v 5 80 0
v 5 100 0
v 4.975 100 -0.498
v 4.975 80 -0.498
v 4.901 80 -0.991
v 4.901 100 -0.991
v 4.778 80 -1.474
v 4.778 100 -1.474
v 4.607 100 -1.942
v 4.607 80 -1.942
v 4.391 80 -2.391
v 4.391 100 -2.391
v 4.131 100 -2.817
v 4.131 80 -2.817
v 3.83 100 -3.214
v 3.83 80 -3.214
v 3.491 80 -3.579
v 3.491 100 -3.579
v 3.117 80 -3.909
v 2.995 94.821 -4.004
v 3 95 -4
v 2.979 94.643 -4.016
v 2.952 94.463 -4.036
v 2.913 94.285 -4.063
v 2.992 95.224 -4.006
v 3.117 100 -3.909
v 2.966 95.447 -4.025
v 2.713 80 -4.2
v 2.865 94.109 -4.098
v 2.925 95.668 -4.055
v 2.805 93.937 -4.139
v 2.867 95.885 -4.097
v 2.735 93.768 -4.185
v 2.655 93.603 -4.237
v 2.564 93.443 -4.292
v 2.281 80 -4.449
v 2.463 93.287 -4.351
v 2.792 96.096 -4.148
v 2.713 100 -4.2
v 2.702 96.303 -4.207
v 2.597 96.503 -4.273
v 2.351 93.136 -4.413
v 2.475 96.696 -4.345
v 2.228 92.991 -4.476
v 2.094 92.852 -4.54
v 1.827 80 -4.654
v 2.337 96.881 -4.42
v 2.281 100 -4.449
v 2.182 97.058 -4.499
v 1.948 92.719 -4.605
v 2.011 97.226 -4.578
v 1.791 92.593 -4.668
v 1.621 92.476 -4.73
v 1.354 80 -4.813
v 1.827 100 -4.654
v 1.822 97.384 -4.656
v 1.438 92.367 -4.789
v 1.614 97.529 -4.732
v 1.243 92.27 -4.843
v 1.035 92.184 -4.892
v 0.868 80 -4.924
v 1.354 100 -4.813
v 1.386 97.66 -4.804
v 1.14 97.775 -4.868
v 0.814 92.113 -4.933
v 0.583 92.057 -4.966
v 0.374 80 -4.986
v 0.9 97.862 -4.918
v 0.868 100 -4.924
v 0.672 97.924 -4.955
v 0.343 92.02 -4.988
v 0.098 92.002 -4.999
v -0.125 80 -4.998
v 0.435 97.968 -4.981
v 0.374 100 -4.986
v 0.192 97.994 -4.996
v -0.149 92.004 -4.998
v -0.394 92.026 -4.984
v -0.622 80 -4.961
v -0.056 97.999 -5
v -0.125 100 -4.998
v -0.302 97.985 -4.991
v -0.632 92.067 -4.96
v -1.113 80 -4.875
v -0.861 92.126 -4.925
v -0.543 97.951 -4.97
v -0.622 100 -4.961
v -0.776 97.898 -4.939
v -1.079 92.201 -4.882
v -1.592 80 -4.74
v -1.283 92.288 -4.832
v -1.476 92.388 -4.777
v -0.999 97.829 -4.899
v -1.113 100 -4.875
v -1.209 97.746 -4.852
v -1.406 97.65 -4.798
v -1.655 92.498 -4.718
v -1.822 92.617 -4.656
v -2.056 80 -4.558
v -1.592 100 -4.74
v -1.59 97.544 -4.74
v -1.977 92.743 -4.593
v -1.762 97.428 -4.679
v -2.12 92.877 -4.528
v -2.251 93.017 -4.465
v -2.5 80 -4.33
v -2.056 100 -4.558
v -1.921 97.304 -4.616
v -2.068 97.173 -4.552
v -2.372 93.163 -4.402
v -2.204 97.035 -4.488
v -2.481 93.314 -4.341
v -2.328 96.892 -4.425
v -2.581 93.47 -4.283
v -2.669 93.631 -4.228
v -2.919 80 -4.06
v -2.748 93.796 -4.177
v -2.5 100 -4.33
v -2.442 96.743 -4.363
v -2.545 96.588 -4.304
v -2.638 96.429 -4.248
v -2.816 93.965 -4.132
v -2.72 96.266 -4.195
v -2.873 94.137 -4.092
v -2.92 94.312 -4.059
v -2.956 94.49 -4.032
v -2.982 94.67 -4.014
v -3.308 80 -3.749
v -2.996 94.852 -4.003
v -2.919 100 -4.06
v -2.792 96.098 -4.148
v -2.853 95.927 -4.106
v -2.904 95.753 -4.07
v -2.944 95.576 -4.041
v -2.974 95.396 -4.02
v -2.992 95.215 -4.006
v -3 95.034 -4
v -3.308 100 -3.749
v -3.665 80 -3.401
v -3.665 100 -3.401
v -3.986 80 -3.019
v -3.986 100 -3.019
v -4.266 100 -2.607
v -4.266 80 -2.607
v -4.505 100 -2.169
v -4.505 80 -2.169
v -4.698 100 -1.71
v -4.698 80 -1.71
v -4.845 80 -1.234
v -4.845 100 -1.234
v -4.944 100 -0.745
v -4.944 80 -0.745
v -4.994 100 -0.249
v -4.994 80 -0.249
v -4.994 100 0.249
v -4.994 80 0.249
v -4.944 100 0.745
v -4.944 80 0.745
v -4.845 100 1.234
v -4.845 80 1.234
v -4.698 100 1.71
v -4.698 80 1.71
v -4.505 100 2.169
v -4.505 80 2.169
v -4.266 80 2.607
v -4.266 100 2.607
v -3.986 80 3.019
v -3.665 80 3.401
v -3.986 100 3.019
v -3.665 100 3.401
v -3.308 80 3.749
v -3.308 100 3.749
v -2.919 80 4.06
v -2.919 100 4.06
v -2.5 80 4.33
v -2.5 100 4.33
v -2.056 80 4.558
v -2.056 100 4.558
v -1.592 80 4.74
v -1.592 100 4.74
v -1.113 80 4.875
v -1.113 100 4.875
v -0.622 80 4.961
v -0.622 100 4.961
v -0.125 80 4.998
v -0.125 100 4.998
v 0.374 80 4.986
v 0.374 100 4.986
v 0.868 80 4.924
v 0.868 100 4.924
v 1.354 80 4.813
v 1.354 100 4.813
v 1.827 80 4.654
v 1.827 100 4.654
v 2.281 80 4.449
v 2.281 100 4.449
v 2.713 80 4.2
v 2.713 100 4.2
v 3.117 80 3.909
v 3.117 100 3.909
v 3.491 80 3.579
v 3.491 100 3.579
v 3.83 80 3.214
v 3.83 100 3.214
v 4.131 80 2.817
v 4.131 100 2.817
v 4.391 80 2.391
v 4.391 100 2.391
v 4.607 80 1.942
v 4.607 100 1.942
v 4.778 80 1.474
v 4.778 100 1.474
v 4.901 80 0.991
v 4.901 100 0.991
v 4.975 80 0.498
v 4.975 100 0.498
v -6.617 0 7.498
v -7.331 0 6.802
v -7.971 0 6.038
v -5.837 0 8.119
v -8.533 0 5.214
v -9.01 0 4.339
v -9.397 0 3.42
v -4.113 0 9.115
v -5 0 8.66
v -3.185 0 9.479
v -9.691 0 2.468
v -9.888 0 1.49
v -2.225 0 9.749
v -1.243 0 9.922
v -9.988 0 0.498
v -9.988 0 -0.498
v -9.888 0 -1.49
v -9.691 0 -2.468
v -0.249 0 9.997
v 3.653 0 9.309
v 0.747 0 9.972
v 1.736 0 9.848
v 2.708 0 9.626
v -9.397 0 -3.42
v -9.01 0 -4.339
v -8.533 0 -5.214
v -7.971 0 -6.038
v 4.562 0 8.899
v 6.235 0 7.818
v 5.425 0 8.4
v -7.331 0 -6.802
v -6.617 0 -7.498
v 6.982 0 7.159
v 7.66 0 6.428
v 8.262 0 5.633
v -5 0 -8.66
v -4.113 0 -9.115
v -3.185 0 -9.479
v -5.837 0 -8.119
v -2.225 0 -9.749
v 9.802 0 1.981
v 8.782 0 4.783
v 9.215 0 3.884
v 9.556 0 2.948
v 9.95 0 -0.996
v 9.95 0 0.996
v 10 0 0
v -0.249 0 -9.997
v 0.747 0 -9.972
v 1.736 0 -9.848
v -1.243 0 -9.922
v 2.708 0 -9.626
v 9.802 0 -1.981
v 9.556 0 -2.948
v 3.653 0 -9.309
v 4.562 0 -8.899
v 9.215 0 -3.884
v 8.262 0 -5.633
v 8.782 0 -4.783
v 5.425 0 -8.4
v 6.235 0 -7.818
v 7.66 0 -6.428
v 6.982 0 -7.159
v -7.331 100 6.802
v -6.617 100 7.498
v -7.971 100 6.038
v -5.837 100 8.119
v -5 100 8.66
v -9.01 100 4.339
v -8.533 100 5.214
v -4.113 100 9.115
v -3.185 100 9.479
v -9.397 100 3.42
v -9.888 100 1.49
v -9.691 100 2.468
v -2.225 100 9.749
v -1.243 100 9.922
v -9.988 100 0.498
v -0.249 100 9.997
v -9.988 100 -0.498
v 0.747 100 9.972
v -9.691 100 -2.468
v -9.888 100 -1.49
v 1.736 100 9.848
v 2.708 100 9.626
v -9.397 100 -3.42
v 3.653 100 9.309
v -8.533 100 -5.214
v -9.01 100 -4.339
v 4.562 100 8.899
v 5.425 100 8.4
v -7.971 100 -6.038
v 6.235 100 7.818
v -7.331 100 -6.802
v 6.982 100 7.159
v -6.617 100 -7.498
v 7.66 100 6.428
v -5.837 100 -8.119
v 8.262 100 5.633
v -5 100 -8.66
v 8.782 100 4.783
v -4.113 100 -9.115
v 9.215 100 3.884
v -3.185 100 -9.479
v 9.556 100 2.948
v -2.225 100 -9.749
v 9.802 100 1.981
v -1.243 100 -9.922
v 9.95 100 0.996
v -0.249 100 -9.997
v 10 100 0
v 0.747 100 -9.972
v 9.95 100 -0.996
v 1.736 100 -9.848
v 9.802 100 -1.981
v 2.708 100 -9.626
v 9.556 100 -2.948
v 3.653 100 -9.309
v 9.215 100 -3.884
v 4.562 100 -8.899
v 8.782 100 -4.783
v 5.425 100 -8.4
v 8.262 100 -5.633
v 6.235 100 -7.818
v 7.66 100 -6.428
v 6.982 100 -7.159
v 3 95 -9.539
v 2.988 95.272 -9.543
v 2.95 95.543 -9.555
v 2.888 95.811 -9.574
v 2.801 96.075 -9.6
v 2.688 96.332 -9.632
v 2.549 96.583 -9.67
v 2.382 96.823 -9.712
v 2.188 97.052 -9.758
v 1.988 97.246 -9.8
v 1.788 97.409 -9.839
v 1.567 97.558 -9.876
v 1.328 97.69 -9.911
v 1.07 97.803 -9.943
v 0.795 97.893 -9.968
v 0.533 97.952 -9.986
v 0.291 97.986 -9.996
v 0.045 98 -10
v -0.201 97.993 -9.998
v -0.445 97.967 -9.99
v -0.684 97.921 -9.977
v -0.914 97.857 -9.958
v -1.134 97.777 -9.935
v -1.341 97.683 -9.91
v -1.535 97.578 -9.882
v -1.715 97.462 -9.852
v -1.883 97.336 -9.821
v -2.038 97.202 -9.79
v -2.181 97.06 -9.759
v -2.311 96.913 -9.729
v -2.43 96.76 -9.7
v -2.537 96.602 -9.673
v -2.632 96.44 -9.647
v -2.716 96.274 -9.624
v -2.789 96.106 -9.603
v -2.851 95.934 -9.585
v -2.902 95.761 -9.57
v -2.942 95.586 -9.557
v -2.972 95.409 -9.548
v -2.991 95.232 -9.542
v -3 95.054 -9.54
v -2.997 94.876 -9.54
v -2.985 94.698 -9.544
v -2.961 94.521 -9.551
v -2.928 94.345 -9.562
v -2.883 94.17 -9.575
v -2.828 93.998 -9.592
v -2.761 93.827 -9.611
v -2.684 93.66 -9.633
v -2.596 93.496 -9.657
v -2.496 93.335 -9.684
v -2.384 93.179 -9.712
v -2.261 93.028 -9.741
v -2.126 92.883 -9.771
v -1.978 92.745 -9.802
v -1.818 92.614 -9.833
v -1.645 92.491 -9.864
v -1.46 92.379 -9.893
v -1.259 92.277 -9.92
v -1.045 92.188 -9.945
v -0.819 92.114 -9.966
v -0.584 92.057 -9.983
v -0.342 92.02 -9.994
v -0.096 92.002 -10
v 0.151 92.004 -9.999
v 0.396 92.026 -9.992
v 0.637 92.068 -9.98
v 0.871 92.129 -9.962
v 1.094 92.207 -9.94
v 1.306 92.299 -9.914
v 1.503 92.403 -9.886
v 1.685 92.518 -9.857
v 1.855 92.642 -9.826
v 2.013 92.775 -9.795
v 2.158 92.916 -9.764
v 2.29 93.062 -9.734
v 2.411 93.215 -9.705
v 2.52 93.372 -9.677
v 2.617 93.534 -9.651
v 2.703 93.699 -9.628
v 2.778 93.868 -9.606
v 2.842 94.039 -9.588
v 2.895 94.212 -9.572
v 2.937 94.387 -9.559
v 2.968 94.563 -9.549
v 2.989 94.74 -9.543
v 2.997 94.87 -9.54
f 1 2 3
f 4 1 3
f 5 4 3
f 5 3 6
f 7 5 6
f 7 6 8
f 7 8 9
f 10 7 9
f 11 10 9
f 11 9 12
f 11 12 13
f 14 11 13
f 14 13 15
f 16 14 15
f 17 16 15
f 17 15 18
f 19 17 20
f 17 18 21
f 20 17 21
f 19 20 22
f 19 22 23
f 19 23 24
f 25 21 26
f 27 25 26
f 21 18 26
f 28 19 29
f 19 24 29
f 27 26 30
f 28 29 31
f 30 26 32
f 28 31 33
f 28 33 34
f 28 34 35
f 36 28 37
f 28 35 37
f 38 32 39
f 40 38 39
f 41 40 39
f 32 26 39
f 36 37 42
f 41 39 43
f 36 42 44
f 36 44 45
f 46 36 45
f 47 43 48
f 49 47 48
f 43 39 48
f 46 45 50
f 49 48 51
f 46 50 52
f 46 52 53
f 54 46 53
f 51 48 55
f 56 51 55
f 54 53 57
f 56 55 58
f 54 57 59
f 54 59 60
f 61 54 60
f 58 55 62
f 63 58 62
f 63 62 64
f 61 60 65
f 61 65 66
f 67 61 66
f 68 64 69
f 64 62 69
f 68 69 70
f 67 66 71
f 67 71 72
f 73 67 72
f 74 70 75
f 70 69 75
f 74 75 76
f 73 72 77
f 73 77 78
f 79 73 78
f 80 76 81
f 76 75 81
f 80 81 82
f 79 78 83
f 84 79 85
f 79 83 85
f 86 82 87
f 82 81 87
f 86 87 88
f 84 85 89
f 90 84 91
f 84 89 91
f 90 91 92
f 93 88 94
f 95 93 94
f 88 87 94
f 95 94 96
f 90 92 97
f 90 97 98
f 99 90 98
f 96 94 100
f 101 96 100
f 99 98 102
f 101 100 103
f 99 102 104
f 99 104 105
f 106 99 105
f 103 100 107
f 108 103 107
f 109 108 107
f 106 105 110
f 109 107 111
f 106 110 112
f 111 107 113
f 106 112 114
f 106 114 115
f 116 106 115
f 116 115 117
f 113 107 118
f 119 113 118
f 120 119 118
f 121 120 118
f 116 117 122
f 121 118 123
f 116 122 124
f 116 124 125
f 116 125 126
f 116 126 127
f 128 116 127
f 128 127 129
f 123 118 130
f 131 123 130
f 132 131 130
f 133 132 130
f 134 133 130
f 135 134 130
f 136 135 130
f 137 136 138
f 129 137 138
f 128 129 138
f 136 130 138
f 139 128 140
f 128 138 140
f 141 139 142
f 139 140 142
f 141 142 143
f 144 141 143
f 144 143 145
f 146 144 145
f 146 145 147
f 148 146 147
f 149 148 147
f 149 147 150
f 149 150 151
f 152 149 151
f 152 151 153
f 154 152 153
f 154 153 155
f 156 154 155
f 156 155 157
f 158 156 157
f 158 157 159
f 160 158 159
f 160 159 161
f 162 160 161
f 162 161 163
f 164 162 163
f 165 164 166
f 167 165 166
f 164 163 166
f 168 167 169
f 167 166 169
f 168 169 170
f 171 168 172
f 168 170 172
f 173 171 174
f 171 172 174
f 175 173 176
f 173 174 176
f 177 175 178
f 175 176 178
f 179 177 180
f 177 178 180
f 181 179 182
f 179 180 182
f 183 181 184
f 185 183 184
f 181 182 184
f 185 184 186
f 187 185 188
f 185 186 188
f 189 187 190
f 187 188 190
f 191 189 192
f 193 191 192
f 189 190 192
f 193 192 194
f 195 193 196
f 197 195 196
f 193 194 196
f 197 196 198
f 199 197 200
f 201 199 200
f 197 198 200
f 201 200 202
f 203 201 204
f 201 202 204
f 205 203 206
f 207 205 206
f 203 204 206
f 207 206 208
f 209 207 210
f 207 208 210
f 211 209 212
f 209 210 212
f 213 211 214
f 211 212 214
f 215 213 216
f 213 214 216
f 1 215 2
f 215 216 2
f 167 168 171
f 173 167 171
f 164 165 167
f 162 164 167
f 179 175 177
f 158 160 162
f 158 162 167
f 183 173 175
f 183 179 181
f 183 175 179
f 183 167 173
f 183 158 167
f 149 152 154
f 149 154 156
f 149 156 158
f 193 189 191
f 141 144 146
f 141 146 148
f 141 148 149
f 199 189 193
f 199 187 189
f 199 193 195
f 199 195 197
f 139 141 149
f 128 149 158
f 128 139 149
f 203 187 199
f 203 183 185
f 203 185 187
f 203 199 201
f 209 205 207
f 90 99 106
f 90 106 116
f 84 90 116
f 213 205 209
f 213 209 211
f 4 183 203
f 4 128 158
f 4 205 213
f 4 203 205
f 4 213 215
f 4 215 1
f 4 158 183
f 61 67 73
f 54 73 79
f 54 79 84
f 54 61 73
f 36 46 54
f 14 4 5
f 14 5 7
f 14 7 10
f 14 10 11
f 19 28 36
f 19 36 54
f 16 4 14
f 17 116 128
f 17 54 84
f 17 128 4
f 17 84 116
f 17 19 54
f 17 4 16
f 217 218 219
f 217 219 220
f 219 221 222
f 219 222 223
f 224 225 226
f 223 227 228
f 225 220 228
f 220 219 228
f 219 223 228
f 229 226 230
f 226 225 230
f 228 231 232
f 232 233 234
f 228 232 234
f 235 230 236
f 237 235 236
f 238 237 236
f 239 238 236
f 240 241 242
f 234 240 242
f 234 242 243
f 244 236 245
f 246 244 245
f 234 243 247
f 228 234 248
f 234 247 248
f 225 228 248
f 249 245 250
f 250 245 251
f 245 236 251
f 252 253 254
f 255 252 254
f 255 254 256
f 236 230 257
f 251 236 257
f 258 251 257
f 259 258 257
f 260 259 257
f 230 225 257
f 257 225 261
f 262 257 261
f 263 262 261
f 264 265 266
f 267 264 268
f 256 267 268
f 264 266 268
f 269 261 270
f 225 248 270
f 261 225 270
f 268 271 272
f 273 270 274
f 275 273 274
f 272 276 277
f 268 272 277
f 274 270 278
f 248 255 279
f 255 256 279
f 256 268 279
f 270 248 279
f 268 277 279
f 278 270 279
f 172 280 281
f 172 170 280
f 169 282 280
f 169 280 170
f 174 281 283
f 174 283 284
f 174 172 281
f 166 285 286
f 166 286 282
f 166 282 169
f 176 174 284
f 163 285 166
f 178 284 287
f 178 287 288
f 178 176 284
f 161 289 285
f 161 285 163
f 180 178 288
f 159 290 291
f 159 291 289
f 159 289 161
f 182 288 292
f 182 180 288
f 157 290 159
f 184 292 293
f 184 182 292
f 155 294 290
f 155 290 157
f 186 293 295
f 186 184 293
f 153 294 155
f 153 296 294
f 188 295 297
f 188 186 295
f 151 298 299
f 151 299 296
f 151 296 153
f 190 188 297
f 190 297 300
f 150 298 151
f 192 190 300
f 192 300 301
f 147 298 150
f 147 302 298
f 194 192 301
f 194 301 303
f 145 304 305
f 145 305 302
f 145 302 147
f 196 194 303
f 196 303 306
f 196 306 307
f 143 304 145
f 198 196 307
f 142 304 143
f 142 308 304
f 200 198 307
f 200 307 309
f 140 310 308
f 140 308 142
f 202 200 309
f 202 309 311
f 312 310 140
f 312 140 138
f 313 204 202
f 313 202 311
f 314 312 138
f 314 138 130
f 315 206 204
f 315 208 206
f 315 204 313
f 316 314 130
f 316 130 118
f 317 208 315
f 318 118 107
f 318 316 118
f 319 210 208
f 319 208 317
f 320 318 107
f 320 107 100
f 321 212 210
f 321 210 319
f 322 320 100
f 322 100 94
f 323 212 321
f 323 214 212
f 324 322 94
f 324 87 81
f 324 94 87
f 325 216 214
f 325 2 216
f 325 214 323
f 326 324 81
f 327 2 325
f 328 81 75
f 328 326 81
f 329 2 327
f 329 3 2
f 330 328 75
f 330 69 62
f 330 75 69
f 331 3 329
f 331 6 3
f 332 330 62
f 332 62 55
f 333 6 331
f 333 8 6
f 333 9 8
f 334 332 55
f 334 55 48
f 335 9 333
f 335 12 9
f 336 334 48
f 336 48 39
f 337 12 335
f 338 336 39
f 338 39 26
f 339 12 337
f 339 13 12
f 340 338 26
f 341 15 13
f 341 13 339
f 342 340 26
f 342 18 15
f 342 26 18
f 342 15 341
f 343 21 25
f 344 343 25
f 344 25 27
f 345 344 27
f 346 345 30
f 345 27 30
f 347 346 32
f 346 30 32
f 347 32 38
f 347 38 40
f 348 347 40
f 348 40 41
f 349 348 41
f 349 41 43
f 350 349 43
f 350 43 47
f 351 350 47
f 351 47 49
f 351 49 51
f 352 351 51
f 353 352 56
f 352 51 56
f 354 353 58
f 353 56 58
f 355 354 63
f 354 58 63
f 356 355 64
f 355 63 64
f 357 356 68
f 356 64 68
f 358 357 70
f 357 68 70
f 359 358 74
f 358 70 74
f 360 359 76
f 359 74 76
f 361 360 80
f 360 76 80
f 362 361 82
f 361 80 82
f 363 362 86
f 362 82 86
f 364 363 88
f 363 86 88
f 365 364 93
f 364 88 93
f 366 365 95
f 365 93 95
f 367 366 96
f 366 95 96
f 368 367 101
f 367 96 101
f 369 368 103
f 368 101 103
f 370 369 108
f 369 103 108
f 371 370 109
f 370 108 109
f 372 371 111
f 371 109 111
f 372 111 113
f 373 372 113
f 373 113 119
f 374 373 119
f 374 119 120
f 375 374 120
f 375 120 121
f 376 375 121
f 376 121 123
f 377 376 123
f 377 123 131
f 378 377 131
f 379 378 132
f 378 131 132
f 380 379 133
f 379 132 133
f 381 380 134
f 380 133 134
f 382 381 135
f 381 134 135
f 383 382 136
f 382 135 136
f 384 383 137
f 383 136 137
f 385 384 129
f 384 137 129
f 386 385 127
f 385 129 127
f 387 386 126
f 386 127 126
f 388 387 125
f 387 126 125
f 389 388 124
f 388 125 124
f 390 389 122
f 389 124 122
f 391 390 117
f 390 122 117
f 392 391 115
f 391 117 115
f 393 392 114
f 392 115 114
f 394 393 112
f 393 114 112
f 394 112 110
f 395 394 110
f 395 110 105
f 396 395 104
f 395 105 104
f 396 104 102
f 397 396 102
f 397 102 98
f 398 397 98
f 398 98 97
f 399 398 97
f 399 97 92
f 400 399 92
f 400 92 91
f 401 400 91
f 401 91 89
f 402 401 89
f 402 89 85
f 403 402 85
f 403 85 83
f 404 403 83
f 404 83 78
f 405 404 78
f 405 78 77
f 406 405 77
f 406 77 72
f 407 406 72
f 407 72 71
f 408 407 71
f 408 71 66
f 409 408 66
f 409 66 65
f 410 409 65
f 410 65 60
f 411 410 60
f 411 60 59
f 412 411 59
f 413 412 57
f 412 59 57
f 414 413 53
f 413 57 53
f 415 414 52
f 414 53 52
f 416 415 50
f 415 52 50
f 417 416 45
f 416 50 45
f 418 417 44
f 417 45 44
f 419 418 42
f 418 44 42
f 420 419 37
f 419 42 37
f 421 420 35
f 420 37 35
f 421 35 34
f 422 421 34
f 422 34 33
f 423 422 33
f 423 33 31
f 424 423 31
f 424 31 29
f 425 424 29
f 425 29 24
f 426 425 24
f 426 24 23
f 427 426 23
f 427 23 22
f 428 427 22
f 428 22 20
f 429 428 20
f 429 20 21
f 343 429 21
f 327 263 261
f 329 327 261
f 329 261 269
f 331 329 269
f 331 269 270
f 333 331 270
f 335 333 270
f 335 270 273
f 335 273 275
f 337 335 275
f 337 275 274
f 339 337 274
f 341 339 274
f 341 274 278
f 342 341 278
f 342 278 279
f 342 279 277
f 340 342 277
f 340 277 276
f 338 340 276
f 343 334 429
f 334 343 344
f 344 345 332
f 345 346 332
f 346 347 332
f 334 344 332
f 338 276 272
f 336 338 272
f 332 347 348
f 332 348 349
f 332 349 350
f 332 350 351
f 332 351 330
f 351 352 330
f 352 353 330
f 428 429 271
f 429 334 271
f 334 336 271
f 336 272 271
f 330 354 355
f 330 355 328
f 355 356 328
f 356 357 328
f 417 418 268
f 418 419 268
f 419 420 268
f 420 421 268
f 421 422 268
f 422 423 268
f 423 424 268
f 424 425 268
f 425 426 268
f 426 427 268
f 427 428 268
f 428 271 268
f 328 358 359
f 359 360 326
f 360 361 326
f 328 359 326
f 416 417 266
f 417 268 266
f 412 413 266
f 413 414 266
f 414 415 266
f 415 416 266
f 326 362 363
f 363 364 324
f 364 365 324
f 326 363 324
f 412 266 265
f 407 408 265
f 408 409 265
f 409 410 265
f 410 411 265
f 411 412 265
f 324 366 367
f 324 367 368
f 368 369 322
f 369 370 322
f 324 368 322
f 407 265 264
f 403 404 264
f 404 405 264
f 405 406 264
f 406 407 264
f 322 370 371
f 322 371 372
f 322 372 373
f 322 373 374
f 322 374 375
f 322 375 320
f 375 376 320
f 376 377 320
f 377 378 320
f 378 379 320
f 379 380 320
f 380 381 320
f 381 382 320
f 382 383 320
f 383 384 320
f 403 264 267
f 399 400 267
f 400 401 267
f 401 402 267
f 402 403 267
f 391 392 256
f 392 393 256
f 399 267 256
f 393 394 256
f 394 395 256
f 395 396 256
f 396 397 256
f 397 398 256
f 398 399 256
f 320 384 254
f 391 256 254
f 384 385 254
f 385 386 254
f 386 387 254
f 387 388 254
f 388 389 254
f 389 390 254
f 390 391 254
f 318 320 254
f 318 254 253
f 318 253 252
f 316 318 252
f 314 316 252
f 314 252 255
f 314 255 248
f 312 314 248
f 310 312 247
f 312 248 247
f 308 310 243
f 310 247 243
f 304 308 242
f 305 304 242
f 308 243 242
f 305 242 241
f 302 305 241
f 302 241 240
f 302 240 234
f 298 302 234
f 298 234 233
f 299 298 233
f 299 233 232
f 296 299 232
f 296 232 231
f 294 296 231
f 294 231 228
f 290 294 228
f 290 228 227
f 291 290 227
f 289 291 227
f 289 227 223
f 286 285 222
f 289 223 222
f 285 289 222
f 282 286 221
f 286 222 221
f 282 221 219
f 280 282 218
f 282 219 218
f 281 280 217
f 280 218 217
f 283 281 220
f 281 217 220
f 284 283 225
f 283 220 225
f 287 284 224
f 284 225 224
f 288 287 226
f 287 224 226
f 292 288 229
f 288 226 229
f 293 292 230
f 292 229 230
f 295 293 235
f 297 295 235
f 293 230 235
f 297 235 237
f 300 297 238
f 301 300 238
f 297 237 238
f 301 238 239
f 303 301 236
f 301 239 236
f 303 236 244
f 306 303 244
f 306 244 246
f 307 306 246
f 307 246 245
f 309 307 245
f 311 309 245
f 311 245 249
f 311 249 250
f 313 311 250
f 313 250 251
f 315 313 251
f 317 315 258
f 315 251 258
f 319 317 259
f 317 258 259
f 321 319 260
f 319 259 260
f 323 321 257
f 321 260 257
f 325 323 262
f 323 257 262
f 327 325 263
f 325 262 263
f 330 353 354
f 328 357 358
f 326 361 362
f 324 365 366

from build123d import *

# Parameters (mm, degrees)
SKETCH1_R           = 10
BOSS_EXTRUDE1_DEPTH = 100
SKETCH2_R           = 5
CUT_EXTRUDE1_DEPTH  = 20
SKETCH3_R           = 3
CUT_EXTRUDE2_DEPTH  = 18


with BuildPart() as part:
    # Sketch1 → Boss-Extrude1 (new body)
    with BuildSketch(Plane(origin=(0, 0, 0), x_dir=(1, 0, 0), z_dir=(0, 1, 0))):
        Circle(SKETCH1_R)
    extrude(amount=BOSS_EXTRUDE1_DEPTH)

    # Sketch2 → Cut-Extrude1 (cut)
    with BuildSketch(Plane(origin=(0, 100, 0), x_dir=(1, 0, 0), z_dir=(0, 1, 0))):
        Circle(SKETCH2_R)
    extrude(amount=-CUT_EXTRUDE1_DEPTH, mode=Mode.SUBTRACT)

    # Sketch3 → Cut-Extrude2 (cut)
    with BuildSketch(Plane.XY):
        with Locations((0, 95)):
            Circle(SKETCH3_R)
    extrude(amount=-CUT_EXTRUDE2_DEPTH, mode=Mode.SUBTRACT)


solid = part.part
